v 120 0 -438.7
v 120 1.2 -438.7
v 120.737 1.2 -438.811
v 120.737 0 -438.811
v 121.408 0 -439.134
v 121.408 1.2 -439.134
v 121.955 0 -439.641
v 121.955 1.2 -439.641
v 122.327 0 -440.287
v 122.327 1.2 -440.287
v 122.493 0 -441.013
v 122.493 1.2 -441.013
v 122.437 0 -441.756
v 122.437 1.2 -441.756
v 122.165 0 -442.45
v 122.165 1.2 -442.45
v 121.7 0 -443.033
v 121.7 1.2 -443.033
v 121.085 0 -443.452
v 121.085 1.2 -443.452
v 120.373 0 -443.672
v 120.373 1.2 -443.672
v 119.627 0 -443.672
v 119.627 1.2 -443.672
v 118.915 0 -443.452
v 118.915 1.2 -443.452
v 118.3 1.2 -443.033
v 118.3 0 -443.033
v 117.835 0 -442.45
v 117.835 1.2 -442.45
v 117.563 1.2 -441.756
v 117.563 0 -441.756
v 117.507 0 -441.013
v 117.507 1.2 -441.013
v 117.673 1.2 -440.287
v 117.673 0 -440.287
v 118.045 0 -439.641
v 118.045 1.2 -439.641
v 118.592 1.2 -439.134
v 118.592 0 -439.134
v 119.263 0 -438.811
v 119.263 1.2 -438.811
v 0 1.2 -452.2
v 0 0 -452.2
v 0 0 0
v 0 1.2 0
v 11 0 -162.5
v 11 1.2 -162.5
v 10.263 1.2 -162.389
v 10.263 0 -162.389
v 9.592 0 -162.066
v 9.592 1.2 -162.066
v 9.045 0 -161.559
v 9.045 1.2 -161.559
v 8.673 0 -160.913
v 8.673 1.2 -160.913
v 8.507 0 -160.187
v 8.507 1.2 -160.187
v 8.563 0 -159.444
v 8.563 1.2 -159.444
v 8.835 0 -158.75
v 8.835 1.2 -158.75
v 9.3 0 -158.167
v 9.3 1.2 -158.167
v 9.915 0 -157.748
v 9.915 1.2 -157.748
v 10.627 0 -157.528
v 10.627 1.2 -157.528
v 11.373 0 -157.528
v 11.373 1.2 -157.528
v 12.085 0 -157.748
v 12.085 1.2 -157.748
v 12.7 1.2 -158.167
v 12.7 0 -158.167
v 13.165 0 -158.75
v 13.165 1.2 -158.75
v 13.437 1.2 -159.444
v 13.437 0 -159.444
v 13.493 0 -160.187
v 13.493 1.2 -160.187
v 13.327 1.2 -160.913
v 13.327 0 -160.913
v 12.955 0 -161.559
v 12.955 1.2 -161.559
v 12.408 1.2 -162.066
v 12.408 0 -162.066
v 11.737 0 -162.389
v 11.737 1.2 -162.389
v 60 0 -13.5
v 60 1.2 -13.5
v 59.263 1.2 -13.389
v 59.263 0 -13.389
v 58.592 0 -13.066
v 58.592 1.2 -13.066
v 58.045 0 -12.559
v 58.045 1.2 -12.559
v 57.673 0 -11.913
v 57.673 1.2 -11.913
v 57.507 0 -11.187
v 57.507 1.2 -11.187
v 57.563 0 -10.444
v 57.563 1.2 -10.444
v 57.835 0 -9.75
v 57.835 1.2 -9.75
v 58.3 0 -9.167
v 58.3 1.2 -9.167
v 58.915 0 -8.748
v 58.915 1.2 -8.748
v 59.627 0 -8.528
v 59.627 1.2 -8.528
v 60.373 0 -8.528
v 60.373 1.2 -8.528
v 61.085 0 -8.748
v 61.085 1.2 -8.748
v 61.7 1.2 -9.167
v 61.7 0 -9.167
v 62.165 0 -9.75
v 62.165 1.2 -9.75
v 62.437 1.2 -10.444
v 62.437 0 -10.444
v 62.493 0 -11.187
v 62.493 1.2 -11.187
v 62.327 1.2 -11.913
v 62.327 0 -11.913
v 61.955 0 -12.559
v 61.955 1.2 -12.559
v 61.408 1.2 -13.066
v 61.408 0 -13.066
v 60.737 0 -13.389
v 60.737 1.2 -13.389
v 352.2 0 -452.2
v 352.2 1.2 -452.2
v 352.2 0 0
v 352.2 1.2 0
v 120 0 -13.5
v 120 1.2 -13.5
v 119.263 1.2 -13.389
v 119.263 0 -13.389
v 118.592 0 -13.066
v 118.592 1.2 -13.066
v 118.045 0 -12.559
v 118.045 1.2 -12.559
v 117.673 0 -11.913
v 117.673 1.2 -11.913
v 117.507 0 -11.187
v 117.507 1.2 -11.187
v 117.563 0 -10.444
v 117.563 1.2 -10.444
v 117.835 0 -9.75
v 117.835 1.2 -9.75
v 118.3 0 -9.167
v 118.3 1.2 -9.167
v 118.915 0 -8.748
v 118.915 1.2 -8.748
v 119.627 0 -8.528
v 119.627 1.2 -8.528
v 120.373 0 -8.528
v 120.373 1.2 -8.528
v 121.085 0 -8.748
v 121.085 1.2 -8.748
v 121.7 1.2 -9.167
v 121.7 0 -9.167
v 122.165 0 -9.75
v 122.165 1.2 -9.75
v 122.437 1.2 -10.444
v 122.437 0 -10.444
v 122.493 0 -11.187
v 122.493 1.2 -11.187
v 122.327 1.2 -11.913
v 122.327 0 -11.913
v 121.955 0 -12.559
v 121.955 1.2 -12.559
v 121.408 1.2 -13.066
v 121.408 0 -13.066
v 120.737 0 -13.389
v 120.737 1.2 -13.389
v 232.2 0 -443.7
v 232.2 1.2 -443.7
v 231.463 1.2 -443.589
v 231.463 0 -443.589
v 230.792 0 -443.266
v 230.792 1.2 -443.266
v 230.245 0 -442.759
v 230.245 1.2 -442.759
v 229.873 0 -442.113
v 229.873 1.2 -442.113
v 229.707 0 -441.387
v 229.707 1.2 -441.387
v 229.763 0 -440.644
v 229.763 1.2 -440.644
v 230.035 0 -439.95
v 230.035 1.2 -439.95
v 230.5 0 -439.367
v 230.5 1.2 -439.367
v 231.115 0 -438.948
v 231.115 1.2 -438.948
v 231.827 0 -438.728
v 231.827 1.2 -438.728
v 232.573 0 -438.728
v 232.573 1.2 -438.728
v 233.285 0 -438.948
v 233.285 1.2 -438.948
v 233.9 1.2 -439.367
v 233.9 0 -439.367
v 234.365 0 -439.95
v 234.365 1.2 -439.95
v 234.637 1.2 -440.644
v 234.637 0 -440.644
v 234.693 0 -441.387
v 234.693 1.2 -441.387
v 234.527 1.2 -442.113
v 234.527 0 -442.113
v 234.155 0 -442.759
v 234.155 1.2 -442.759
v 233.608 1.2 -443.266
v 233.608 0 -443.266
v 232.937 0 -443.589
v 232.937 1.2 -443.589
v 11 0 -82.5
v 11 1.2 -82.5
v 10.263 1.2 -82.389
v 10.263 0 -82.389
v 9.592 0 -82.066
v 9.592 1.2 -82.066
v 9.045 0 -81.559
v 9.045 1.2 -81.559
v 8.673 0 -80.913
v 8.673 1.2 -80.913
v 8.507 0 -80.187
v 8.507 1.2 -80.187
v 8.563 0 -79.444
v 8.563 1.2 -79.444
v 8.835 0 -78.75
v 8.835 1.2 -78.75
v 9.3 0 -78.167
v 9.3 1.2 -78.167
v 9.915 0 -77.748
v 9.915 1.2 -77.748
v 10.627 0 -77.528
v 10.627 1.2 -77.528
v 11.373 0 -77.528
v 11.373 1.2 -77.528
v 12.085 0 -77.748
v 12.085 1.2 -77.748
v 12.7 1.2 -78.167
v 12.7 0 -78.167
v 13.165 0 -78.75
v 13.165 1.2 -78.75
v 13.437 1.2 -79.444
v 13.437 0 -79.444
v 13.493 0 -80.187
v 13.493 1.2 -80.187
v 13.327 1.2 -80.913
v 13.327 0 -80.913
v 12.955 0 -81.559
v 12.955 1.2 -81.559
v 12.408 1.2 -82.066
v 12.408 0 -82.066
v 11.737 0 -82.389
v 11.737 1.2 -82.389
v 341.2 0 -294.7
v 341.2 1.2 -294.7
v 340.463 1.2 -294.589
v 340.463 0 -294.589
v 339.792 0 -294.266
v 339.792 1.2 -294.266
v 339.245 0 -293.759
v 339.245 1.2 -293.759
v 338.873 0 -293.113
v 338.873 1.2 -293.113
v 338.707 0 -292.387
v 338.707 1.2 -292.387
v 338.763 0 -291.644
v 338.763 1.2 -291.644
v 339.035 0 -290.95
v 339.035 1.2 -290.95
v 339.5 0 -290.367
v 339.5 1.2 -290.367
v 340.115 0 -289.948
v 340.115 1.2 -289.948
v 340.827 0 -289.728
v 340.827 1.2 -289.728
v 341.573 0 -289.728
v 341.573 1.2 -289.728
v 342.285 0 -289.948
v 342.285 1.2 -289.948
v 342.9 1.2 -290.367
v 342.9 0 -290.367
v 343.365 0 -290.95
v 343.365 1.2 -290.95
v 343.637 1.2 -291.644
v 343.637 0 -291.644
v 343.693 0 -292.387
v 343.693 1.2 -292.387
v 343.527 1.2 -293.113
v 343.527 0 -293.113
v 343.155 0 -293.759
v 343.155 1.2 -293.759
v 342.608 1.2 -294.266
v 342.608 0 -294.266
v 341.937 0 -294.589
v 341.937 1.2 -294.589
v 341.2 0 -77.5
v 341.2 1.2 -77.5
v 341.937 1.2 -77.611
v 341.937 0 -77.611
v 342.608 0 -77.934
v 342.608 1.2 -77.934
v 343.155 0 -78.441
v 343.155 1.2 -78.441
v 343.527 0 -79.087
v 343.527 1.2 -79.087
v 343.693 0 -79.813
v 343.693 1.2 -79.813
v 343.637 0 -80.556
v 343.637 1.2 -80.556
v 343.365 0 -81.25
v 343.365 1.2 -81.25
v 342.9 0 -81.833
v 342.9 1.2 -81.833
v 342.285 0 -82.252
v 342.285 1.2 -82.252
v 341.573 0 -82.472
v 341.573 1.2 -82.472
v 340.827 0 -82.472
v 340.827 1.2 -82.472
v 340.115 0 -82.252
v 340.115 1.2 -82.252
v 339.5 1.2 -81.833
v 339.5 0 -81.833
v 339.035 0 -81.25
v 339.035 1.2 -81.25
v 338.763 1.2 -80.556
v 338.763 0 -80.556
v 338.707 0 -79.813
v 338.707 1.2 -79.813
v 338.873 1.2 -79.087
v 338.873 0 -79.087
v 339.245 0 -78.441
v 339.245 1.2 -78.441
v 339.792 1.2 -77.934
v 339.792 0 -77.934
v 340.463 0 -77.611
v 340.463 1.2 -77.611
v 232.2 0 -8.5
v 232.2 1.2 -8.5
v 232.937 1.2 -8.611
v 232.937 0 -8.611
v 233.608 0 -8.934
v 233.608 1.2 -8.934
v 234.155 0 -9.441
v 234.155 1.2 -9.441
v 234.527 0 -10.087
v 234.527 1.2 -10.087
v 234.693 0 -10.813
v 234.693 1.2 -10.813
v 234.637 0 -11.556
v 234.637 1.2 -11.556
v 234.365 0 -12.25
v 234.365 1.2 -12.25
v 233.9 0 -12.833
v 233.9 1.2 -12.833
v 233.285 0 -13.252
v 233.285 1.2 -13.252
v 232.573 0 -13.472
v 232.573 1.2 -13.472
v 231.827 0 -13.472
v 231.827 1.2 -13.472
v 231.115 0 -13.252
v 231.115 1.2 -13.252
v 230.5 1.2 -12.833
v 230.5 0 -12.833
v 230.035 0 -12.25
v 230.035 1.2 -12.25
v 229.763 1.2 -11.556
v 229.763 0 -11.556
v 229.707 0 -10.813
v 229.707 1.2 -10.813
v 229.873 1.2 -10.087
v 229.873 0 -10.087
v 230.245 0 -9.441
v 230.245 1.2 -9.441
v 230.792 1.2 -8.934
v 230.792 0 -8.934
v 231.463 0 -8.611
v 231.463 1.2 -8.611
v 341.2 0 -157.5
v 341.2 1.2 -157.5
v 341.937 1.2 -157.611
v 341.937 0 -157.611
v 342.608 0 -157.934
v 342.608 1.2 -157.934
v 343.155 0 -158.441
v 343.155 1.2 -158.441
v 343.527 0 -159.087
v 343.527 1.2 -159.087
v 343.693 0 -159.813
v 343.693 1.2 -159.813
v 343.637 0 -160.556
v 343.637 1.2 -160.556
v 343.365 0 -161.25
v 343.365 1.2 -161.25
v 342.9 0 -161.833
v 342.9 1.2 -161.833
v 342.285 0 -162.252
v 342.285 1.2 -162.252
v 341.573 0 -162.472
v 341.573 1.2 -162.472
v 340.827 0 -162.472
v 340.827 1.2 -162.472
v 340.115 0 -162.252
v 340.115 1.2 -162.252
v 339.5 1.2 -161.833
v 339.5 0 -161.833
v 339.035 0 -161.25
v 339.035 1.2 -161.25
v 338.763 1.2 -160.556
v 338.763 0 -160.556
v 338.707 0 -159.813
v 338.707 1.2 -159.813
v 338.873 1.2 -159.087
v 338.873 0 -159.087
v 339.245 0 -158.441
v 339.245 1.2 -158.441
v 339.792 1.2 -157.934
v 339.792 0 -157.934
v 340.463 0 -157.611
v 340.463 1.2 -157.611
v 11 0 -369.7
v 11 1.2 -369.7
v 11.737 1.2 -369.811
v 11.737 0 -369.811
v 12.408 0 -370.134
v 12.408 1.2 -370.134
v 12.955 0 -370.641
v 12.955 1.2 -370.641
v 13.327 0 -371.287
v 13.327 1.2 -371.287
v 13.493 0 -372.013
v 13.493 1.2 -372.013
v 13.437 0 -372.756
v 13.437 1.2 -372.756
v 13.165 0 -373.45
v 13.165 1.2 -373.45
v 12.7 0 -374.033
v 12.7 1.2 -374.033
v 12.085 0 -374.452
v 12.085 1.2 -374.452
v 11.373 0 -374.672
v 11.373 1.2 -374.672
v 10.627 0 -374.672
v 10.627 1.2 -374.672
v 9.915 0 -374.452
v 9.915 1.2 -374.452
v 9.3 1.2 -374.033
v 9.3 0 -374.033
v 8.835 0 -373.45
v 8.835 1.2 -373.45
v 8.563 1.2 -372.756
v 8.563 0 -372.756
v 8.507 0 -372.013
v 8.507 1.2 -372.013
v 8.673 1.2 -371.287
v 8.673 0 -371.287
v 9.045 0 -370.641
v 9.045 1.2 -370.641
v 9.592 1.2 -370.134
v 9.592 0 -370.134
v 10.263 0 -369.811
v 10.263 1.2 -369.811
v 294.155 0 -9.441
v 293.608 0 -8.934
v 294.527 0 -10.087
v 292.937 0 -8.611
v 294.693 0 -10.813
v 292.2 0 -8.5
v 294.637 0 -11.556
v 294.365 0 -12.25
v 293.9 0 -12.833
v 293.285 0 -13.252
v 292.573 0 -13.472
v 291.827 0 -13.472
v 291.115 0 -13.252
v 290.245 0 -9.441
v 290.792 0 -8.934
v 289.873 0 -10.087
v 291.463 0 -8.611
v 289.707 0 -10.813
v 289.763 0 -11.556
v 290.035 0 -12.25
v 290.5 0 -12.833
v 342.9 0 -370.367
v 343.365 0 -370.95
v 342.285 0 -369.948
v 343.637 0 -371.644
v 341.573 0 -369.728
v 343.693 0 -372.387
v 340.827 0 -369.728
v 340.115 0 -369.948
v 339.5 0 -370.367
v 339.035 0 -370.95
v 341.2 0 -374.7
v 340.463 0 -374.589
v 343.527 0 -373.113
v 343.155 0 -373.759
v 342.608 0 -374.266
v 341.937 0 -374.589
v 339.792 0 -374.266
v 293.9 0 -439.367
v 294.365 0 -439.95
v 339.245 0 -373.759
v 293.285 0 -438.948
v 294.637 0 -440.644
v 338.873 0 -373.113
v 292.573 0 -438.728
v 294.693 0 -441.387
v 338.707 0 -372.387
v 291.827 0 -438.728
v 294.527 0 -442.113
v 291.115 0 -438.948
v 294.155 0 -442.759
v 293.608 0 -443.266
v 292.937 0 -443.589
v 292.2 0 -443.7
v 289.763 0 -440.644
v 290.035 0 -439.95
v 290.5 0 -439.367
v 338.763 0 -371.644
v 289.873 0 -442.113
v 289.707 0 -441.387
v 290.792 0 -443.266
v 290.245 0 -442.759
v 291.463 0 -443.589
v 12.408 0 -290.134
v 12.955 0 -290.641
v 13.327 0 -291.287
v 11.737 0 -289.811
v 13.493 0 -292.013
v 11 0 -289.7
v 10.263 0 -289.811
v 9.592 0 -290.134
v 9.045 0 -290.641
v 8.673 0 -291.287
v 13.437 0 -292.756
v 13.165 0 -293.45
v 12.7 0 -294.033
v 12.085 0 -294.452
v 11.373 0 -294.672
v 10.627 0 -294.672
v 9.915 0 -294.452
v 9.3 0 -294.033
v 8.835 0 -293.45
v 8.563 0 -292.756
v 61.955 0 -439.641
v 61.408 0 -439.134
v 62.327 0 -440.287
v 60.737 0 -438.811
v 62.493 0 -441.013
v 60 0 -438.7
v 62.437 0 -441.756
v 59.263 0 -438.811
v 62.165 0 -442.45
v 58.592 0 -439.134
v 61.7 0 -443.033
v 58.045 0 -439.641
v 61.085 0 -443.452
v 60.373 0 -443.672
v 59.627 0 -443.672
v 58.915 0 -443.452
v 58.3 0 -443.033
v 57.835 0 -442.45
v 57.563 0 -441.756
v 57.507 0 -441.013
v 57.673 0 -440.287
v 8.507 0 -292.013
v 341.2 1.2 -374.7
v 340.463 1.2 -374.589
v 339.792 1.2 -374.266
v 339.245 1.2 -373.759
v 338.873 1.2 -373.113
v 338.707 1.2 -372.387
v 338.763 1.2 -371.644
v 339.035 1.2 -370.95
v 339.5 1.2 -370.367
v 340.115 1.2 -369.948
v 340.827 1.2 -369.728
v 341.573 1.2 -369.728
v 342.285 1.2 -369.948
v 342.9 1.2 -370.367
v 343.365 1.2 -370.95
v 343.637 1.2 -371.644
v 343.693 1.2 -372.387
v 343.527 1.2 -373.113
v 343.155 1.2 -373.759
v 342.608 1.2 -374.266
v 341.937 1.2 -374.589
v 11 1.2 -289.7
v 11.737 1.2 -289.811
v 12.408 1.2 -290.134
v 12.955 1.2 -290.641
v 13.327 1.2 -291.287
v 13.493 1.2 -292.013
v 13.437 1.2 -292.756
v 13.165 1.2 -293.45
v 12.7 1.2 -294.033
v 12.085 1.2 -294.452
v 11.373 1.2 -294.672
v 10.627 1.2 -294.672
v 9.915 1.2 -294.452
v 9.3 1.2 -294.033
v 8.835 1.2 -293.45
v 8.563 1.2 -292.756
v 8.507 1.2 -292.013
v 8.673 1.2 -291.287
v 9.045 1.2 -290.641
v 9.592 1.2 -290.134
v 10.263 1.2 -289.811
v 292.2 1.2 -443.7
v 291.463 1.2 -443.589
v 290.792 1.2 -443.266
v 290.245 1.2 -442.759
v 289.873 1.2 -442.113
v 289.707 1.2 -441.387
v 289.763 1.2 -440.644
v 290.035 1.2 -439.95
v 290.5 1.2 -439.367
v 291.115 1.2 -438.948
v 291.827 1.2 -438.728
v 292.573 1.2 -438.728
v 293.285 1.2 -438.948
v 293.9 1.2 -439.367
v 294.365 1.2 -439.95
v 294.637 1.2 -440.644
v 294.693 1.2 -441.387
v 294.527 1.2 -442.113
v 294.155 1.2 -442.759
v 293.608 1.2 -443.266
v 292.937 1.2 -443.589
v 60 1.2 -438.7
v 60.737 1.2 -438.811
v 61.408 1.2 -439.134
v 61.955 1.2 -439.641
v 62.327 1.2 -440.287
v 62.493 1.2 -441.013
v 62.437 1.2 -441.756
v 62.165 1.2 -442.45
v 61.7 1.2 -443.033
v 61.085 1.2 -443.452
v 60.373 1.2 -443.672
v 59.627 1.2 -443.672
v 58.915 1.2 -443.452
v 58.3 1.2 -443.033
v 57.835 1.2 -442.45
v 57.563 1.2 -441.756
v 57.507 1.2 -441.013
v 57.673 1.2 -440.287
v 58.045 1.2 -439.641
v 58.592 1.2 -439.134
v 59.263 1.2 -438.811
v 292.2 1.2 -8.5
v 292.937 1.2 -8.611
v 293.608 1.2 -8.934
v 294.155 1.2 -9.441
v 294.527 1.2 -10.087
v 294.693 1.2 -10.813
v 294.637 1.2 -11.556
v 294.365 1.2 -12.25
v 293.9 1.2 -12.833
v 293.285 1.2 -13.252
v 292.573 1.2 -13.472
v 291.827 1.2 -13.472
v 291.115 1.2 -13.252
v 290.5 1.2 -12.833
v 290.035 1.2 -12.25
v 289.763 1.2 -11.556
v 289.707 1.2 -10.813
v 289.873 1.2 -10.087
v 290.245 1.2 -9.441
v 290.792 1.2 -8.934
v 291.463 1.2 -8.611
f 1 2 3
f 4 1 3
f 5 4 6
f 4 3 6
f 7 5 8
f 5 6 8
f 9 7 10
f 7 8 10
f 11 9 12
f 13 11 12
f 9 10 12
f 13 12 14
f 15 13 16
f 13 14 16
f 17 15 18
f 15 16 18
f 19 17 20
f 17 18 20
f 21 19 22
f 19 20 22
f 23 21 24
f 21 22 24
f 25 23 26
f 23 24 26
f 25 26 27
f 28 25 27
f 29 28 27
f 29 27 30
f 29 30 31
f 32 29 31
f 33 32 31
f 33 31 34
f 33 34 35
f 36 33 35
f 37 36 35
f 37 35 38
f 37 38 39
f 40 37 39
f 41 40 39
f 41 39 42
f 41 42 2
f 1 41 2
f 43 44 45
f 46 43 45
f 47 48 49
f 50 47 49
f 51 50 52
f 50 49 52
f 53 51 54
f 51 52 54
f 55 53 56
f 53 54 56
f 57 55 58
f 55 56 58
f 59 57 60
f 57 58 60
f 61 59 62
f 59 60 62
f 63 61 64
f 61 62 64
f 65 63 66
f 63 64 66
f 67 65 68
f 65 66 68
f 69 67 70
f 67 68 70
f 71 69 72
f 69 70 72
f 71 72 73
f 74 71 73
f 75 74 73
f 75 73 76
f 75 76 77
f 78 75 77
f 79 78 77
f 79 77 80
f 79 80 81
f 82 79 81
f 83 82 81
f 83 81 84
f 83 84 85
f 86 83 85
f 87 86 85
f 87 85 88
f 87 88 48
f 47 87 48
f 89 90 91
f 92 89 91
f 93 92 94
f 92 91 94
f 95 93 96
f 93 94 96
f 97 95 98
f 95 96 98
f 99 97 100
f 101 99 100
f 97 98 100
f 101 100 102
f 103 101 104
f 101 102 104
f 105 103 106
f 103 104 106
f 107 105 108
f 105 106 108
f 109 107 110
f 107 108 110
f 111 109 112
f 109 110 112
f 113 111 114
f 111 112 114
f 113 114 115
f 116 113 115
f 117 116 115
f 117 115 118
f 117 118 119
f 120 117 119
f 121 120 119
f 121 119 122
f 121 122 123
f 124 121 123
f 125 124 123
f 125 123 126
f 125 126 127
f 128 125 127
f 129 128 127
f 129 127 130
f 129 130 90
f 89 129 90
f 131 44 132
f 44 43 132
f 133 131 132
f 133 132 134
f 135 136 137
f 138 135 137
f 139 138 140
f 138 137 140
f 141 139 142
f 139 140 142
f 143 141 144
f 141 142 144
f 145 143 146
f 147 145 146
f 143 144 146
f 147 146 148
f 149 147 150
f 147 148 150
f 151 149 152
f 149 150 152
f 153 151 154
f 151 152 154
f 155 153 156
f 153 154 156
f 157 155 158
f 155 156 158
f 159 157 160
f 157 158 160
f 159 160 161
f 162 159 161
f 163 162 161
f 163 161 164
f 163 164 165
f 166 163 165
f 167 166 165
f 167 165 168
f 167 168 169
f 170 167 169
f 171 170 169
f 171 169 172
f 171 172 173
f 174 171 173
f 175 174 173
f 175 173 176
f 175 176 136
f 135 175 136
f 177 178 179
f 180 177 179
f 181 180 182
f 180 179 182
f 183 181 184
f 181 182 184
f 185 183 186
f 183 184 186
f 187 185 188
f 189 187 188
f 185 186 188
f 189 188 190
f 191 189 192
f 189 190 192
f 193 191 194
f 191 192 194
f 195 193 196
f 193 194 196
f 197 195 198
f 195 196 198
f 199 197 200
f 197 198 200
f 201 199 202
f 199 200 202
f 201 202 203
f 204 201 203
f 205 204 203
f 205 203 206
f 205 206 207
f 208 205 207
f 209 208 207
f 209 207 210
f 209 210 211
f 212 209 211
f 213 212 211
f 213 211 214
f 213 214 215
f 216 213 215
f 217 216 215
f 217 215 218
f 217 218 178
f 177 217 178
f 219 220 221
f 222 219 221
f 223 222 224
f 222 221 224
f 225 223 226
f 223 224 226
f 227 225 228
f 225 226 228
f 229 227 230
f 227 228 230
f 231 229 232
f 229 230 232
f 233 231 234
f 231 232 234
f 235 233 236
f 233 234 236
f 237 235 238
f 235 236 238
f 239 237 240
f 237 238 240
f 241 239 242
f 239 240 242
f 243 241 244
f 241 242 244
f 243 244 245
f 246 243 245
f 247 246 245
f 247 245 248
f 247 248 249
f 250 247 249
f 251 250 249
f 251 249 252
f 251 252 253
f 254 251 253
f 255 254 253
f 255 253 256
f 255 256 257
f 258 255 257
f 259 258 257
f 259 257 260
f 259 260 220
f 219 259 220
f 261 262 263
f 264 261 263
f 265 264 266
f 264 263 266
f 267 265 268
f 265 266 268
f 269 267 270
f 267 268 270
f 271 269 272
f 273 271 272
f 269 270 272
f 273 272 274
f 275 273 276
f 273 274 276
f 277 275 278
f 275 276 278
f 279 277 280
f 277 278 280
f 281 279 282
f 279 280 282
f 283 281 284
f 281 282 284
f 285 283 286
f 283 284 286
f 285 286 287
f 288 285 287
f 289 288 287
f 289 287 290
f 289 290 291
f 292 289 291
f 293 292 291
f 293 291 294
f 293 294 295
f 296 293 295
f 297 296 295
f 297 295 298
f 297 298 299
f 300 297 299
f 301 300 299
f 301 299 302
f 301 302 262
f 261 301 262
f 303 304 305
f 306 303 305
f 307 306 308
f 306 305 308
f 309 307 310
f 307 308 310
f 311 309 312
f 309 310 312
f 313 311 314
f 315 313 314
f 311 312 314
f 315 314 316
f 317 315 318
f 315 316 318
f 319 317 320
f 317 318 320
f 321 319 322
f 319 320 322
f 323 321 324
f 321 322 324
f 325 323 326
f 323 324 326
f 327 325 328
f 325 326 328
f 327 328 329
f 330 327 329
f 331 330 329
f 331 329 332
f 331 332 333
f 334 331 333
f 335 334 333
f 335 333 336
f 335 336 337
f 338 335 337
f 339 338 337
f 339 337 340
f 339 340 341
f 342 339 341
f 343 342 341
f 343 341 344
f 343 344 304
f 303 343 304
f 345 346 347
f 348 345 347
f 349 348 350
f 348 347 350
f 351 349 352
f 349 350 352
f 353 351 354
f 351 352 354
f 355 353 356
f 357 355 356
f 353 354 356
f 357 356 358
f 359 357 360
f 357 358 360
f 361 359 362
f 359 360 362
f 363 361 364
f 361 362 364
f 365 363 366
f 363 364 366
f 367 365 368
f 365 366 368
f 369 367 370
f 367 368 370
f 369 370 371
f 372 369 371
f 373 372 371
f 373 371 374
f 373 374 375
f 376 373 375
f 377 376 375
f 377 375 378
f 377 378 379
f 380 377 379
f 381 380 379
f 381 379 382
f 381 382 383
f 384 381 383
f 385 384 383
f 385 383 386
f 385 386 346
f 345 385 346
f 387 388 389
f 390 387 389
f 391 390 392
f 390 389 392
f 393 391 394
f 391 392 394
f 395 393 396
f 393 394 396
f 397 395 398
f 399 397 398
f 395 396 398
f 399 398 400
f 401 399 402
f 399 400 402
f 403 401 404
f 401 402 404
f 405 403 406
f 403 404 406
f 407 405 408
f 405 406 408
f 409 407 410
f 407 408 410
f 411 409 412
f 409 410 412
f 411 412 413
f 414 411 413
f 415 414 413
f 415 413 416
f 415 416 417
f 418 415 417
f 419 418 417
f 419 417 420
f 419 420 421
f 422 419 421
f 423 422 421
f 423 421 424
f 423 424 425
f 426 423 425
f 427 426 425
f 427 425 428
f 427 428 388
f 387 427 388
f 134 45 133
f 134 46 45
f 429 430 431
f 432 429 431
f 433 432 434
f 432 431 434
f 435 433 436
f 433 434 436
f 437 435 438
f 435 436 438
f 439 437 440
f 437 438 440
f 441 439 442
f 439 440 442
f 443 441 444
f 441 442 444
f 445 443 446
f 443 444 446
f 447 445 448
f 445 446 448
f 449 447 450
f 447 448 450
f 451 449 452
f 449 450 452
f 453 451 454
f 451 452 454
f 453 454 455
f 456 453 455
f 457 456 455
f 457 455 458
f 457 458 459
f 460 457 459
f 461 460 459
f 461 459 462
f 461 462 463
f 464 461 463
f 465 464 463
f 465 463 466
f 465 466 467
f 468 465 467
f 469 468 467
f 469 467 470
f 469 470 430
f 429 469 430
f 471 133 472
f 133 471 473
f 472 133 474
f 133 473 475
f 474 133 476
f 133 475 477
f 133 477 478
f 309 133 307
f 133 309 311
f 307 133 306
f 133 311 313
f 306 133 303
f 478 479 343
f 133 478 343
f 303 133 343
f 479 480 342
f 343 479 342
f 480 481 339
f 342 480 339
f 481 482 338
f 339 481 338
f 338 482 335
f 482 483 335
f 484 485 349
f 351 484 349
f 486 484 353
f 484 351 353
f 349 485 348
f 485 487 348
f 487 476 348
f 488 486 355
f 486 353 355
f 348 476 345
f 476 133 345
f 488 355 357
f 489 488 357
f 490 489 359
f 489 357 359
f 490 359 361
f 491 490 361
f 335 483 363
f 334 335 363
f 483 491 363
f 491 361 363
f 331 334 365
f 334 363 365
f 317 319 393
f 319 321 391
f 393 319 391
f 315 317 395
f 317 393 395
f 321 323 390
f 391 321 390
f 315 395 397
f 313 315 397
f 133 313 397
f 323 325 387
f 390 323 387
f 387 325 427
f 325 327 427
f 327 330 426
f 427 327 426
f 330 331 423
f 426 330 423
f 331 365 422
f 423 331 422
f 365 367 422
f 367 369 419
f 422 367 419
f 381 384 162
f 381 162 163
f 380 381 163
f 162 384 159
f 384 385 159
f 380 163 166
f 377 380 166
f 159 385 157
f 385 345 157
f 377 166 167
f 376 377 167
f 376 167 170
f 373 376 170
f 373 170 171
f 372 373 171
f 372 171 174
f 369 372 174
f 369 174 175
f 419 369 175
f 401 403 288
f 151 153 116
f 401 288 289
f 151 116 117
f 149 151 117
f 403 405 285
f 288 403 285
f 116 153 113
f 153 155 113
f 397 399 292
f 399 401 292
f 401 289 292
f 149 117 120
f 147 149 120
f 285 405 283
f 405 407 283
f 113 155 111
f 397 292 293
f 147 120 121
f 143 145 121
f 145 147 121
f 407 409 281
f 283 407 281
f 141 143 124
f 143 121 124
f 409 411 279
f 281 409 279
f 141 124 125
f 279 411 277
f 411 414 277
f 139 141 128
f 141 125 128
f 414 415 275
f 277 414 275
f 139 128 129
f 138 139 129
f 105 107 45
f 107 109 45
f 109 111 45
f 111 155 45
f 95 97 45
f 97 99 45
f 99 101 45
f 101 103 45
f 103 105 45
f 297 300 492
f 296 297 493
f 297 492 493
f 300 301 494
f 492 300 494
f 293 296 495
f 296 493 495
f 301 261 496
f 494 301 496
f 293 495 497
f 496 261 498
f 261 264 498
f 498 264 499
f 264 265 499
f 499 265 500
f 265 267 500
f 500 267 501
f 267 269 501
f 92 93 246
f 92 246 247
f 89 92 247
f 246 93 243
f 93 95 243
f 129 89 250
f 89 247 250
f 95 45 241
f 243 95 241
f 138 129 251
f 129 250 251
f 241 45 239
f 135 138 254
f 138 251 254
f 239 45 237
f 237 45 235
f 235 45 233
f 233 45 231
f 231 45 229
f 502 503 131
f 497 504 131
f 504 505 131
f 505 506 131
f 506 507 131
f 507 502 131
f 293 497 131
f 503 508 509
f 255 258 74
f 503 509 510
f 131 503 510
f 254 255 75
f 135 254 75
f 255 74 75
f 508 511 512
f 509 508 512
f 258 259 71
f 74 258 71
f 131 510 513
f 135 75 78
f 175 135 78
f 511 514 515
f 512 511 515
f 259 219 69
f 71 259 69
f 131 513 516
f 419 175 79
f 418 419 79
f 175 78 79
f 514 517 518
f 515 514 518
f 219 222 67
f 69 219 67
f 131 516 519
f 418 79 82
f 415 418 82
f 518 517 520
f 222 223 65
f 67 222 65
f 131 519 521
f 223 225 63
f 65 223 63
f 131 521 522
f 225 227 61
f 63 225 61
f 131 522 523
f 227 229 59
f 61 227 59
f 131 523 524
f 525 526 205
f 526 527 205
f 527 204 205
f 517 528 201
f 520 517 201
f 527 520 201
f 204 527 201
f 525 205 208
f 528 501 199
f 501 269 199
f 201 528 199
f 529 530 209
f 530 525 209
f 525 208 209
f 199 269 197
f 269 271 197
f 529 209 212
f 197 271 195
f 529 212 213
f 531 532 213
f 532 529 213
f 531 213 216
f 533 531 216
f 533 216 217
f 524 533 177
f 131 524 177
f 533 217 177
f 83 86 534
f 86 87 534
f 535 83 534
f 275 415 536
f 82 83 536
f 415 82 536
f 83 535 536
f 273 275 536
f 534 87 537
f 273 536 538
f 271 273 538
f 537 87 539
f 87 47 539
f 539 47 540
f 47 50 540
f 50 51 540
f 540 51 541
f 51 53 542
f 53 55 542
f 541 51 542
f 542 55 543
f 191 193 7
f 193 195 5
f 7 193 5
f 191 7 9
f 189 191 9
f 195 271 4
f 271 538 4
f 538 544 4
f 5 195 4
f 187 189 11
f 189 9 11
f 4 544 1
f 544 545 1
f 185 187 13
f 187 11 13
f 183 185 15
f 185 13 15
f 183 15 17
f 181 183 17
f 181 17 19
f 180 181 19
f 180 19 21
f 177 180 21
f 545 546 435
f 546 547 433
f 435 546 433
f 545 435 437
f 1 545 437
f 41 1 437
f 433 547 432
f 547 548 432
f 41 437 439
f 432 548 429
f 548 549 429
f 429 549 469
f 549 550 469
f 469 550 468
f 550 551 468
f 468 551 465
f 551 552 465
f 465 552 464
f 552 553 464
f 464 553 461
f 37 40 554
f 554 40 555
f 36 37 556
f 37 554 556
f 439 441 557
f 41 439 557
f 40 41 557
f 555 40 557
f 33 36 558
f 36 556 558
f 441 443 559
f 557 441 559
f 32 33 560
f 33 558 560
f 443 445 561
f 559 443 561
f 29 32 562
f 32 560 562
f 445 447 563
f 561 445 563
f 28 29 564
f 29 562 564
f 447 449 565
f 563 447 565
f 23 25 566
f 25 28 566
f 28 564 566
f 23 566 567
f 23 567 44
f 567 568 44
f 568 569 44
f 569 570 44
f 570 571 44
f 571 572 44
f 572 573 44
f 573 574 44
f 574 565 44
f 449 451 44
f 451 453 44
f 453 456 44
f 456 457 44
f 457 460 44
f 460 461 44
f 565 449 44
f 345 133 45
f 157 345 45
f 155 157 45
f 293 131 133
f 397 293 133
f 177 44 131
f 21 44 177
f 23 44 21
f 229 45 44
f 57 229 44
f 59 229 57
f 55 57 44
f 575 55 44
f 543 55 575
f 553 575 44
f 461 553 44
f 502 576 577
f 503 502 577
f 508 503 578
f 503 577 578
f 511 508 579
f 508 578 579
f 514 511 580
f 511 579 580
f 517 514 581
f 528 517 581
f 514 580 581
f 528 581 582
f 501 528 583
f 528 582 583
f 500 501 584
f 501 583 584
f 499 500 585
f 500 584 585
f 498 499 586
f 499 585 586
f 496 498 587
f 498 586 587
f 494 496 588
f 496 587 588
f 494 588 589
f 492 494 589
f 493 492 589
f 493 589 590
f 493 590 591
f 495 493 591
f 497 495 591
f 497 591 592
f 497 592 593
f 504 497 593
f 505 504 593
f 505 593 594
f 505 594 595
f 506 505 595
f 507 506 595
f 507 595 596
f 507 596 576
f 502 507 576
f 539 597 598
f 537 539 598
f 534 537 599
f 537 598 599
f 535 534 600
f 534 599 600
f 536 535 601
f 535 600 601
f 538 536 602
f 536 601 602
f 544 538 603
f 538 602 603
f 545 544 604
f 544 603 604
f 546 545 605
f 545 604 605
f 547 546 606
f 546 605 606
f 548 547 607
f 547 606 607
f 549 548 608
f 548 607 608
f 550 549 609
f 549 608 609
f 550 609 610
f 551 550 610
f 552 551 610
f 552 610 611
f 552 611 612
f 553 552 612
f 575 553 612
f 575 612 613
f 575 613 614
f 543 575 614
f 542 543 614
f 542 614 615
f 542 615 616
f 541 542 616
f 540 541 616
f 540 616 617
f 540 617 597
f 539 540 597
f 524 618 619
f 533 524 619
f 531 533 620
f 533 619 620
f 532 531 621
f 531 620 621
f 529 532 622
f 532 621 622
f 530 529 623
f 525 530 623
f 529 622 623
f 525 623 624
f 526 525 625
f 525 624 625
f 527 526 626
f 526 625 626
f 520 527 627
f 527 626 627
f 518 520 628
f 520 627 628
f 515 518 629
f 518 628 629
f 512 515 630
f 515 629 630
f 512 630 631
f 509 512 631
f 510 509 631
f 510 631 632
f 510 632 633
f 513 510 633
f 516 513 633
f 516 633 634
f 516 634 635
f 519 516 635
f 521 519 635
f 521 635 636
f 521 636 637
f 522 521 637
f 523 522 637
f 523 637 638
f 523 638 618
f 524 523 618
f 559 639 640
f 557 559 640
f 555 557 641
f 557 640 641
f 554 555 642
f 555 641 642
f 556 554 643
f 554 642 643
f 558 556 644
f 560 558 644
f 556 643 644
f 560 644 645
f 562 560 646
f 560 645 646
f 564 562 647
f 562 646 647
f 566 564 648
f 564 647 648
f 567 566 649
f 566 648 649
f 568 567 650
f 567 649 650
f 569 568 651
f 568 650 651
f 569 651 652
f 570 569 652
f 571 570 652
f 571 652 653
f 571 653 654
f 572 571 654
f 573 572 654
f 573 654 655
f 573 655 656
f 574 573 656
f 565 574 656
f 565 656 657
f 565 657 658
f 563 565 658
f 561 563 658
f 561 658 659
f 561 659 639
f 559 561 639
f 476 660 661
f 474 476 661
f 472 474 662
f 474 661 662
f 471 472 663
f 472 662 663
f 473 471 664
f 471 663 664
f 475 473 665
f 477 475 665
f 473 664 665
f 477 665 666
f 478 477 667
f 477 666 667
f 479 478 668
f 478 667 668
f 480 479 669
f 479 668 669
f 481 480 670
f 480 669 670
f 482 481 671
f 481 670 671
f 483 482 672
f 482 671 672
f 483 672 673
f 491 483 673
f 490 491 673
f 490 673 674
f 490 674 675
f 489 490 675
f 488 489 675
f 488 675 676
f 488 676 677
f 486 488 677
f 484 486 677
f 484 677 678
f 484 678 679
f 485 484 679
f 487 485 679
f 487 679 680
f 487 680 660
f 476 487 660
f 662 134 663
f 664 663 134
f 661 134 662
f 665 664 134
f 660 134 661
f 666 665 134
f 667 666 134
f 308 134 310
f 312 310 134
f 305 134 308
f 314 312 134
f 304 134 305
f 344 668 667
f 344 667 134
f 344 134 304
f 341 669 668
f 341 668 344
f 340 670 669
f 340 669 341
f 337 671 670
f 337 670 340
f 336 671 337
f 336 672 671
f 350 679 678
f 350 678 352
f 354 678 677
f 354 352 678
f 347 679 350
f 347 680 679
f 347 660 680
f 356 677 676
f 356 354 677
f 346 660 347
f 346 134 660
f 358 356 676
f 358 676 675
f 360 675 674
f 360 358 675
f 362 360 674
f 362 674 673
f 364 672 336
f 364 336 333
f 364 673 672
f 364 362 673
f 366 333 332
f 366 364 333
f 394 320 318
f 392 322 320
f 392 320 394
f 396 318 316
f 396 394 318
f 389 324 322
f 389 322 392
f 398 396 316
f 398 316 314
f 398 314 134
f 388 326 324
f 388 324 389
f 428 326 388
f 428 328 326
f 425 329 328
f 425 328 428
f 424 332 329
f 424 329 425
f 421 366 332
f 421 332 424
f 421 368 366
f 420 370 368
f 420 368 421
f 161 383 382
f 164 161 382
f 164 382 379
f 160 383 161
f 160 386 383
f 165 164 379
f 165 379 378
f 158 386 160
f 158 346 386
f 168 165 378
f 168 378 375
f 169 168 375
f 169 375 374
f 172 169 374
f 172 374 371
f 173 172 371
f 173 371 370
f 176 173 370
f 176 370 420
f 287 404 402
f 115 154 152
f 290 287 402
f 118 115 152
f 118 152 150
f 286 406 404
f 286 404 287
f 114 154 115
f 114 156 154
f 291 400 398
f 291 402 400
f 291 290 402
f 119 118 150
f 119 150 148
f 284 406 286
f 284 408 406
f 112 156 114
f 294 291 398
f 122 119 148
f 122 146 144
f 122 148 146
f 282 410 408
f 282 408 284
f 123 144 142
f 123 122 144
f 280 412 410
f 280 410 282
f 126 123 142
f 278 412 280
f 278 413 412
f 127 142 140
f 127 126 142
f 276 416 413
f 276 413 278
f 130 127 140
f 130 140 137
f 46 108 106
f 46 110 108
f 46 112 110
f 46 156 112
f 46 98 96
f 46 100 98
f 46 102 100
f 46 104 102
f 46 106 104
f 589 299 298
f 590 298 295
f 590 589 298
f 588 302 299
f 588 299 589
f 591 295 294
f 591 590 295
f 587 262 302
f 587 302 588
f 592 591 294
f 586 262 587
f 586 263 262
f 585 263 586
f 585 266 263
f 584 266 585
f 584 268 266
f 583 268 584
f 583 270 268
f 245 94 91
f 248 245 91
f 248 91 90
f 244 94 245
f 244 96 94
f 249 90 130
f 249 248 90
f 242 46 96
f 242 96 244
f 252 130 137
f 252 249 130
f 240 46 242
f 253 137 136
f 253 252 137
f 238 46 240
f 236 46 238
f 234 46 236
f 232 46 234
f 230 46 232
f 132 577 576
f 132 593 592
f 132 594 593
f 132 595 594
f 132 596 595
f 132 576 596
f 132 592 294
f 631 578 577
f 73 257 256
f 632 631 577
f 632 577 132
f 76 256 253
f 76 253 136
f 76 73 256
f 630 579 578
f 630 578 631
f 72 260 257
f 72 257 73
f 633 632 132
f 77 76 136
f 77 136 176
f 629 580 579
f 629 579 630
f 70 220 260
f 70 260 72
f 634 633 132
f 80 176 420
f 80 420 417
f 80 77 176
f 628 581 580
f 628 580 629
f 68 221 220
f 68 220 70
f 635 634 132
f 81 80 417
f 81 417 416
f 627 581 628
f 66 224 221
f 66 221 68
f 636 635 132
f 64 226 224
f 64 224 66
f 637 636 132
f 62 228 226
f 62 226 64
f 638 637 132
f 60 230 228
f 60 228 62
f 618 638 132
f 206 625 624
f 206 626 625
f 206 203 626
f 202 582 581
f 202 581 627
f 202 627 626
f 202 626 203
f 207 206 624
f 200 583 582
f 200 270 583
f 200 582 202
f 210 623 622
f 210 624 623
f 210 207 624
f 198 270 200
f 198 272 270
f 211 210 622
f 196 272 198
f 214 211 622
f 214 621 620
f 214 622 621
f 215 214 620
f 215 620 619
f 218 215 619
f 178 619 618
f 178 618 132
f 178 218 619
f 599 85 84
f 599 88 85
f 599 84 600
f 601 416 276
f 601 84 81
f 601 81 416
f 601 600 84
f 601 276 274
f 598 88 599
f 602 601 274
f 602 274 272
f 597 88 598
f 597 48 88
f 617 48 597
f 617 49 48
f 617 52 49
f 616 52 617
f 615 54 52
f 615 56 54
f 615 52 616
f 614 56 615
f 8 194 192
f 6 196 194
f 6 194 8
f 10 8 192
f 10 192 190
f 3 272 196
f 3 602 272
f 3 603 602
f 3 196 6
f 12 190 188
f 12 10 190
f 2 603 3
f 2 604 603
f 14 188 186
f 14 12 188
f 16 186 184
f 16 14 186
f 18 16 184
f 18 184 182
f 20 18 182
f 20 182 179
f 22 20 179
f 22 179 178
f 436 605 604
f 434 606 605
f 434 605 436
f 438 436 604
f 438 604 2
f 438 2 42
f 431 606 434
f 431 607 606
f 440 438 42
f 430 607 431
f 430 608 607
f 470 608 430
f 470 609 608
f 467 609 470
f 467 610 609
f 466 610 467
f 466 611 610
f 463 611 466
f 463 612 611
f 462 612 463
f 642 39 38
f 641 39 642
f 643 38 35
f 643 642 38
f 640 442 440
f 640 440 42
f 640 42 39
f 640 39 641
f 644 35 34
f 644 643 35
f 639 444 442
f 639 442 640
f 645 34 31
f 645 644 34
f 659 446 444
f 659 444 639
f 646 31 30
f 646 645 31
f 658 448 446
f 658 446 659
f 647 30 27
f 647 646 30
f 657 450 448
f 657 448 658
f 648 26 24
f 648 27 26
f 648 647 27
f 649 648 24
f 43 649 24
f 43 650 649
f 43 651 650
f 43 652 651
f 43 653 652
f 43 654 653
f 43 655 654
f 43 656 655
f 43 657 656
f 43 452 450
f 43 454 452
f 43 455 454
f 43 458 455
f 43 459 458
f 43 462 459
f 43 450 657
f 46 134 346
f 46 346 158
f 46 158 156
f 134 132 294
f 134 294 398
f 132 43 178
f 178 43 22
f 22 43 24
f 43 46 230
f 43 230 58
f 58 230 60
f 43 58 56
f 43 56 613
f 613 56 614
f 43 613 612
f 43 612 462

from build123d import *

# Parameters (mm, degrees)
SURFACE_EXTRUDE1_1_DEPTH = 352.2
THICKEN1_T1              = 1.2
SKETCH2_R                = 2.5
CUT_EXTRUDE1_DEPTH       = 10


with BuildPart() as body_1:
    # Surface-Extrude1: a surface, the sketch's curves swept straight by 352.2 mm
    with BuildLine(Plane(origin=(0, 0, 0), x_dir=(0, 0, -1), z_dir=(1, 0, 0)), mode=Mode.PRIVATE) as surface_extrude1_1_path:
        Line((0, 0), (452.2, 0))
    surface_extrude1_1 = Shell.extrude(surface_extrude1_1_path.wire(), (1 * SURFACE_EXTRUDE1_1_DEPTH, 0 * SURFACE_EXTRUDE1_1_DEPTH, 0 * SURFACE_EXTRUDE1_1_DEPTH))
    add(Solid.thicken(surface_extrude1_1, THICKEN1_T1))

    # Sketch2 → Cut-Extrude1 (cut)
    with BuildSketch(Plane(origin=(0, 1.2, 0), x_dir=(1, 0, 0), z_dir=(0, 1, 0))):
        with Locations(Location((60, 441.2, 0), (0, 0, 270))):
            Circle(SKETCH2_R)
        with Locations(Location((120, 441.2, 0), (0, 0, 270))):
            Circle(SKETCH2_R)
        with Locations(Location((11, 372.2, 0), (0, 0, 270))):
            Circle(SKETCH2_R)
        with Locations(Location((11, 292.2, 0), (0, 0, 270))):
            Circle(SKETCH2_R)
        with Locations(Location((341.2, 292.2, 0), (0, 0, 90))):
            Circle(SKETCH2_R)
        with Locations(Location((341.2, 372.2, 0), (0, 0, 90))):
            Circle(SKETCH2_R)
        with Locations(Location((292.2, 441.2, 0), (0, 0, 90))):
            Circle(SKETCH2_R)
        with Locations(Location((232.2, 441.2, 0), (0, 0, 90))):
            Circle(SKETCH2_R)
        with Locations(Location((11, 160, 0), (0, 0, 90))):
            Circle(SKETCH2_R)
        with Locations(Location((11, 80, 0), (0, 0, 90))):
            Circle(SKETCH2_R)
        with Locations(Location((60, 11, 0), (0, 0, 90))):
            Circle(SKETCH2_R)
        with Locations(Location((120, 11, 0), (0, 0, 90))):
            Circle(SKETCH2_R)
        with Locations(Location((232.2, 11, 0), (0, 0, 270))):
            Circle(SKETCH2_R)
        with Locations(Location((292.2, 11, 0), (0, 0, 270))):
            Circle(SKETCH2_R)
        with Locations(Location((341.2, 80, 0), (0, 0, 270))):
            Circle(SKETCH2_R)
        with Locations(Location((341.2, 160, 0), (0, 0, 270))):
            Circle(SKETCH2_R)
    extrude(amount=-CUT_EXTRUDE1_DEPTH, mode=Mode.SUBTRACT)


solid = body_1.part
